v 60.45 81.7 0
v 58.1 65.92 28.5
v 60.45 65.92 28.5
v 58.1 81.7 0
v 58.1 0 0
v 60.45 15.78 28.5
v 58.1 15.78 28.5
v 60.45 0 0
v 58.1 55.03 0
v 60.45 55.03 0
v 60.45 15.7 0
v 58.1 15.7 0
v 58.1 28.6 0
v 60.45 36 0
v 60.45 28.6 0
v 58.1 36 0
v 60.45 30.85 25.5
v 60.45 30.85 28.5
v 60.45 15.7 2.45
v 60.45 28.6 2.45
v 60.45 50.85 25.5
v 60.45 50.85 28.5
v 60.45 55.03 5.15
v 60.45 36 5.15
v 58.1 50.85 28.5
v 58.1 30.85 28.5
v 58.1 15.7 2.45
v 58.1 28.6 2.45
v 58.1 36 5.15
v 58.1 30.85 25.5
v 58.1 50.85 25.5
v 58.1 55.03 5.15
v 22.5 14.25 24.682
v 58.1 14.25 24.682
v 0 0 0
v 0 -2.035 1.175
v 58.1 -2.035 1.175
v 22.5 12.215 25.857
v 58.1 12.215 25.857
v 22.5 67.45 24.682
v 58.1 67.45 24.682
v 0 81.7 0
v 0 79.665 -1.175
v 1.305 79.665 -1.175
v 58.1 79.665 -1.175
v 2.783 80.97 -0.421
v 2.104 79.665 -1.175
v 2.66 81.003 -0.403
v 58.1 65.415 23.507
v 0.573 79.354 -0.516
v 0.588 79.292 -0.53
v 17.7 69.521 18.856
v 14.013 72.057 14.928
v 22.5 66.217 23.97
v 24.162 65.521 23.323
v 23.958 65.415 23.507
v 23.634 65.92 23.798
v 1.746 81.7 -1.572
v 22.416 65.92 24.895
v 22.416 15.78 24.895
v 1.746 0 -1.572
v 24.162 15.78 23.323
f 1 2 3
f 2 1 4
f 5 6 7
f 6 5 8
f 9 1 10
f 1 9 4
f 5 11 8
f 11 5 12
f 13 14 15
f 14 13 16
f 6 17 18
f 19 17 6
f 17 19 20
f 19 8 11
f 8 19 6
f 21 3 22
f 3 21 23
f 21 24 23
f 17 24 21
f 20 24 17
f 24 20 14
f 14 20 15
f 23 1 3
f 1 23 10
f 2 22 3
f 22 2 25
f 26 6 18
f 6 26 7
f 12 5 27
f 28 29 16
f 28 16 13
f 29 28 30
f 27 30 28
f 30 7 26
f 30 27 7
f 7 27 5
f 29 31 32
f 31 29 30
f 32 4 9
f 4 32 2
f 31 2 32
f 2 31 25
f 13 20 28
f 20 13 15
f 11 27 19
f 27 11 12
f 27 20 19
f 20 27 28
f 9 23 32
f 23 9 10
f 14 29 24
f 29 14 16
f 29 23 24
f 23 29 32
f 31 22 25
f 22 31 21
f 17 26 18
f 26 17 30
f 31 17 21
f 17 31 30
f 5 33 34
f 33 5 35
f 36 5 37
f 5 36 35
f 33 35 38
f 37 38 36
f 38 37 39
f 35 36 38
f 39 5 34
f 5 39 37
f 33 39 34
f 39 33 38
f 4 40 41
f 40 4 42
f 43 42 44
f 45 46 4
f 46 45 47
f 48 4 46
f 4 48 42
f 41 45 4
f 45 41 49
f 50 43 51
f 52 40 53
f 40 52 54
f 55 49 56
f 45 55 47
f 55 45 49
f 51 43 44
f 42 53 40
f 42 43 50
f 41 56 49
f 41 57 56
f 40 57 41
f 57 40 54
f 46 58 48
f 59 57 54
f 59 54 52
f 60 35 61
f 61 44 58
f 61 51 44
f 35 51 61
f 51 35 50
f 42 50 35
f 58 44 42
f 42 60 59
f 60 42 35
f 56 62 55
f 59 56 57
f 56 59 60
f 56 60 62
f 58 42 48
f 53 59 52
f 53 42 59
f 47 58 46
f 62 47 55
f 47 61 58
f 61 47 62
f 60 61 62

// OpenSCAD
materialHeight=2.35;
baseWidth = 81.7;
topWidth = 50.14;
height=28.5;

topNotchWidth=20; //TODO:Need to measure this!!!
topNotchDepth=3; //TODO:Need to measure this!!!

offset = (baseWidth - topWidth) / 2;

f_BaseWidth = 58.1;
f_TopWidth = 35.6;
f_offset = (f_BaseWidth - f_TopWidth);

//l_height = sqrt( pow((f_BaseWidth-f_TopWidth),2) + pow(height,2));
l_height = height+5;
l_baseWidth = baseWidth;
l_topWidth = topWidth;
l_offset = (l_baseWidth - l_topWidth) / 2;

module leftPiece()
{
	linear_extrude(height = materialHeight) 
		polygon(points=[[0,0],[l_offset,l_height],
				[l_offset+l_topWidth,l_height],[l_baseWidth,0],[0,0]]);
}

module backPiece()
{
	frontPiece();
}

module frontPiece() {
	linear_extrude(height = materialHeight) 
		polygon(points=[[0,0],[f_offset,height],
				[f_BaseWidth,height],[f_BaseWidth,0],[0,0]]);

	//TODO: Subtract the hole
}

module rightPiece() {

	topNotchOffset = offset + (topWidth-topNotchWidth) /2;

	difference()
	{
		linear_extrude(height = materialHeight) 
		polygon(points=[[0,0],[offset,height],
				[baseWidth-offset,height],[baseWidth,0],[0,0]]);

		translate([15.7,0,0]) cube([12.9, 2.45, 5]);
		translate([15.7+12.9+7.4,0,0]) cube([19.03, 5.15, 5]);

		translate([topNotchOffset,height-topNotchDepth,0]) 
			cube([topNotchWidth, topNotchDepth, 5]);
	}
}


rotate(60,v=[1,0,0]) frontPiece();

translate([f_BaseWidth,0,0])
	rotate(90,[0,1,0]) 
		rotate(90,[0,0,1])
			rightPiece();

translate([0,baseWidth,0])
	rotate(180-60,[1,0,0])
		backPiece();

rotate(180-48,[0,1,0])
	rotate(90,[0,0,1])
		leftPiece();
